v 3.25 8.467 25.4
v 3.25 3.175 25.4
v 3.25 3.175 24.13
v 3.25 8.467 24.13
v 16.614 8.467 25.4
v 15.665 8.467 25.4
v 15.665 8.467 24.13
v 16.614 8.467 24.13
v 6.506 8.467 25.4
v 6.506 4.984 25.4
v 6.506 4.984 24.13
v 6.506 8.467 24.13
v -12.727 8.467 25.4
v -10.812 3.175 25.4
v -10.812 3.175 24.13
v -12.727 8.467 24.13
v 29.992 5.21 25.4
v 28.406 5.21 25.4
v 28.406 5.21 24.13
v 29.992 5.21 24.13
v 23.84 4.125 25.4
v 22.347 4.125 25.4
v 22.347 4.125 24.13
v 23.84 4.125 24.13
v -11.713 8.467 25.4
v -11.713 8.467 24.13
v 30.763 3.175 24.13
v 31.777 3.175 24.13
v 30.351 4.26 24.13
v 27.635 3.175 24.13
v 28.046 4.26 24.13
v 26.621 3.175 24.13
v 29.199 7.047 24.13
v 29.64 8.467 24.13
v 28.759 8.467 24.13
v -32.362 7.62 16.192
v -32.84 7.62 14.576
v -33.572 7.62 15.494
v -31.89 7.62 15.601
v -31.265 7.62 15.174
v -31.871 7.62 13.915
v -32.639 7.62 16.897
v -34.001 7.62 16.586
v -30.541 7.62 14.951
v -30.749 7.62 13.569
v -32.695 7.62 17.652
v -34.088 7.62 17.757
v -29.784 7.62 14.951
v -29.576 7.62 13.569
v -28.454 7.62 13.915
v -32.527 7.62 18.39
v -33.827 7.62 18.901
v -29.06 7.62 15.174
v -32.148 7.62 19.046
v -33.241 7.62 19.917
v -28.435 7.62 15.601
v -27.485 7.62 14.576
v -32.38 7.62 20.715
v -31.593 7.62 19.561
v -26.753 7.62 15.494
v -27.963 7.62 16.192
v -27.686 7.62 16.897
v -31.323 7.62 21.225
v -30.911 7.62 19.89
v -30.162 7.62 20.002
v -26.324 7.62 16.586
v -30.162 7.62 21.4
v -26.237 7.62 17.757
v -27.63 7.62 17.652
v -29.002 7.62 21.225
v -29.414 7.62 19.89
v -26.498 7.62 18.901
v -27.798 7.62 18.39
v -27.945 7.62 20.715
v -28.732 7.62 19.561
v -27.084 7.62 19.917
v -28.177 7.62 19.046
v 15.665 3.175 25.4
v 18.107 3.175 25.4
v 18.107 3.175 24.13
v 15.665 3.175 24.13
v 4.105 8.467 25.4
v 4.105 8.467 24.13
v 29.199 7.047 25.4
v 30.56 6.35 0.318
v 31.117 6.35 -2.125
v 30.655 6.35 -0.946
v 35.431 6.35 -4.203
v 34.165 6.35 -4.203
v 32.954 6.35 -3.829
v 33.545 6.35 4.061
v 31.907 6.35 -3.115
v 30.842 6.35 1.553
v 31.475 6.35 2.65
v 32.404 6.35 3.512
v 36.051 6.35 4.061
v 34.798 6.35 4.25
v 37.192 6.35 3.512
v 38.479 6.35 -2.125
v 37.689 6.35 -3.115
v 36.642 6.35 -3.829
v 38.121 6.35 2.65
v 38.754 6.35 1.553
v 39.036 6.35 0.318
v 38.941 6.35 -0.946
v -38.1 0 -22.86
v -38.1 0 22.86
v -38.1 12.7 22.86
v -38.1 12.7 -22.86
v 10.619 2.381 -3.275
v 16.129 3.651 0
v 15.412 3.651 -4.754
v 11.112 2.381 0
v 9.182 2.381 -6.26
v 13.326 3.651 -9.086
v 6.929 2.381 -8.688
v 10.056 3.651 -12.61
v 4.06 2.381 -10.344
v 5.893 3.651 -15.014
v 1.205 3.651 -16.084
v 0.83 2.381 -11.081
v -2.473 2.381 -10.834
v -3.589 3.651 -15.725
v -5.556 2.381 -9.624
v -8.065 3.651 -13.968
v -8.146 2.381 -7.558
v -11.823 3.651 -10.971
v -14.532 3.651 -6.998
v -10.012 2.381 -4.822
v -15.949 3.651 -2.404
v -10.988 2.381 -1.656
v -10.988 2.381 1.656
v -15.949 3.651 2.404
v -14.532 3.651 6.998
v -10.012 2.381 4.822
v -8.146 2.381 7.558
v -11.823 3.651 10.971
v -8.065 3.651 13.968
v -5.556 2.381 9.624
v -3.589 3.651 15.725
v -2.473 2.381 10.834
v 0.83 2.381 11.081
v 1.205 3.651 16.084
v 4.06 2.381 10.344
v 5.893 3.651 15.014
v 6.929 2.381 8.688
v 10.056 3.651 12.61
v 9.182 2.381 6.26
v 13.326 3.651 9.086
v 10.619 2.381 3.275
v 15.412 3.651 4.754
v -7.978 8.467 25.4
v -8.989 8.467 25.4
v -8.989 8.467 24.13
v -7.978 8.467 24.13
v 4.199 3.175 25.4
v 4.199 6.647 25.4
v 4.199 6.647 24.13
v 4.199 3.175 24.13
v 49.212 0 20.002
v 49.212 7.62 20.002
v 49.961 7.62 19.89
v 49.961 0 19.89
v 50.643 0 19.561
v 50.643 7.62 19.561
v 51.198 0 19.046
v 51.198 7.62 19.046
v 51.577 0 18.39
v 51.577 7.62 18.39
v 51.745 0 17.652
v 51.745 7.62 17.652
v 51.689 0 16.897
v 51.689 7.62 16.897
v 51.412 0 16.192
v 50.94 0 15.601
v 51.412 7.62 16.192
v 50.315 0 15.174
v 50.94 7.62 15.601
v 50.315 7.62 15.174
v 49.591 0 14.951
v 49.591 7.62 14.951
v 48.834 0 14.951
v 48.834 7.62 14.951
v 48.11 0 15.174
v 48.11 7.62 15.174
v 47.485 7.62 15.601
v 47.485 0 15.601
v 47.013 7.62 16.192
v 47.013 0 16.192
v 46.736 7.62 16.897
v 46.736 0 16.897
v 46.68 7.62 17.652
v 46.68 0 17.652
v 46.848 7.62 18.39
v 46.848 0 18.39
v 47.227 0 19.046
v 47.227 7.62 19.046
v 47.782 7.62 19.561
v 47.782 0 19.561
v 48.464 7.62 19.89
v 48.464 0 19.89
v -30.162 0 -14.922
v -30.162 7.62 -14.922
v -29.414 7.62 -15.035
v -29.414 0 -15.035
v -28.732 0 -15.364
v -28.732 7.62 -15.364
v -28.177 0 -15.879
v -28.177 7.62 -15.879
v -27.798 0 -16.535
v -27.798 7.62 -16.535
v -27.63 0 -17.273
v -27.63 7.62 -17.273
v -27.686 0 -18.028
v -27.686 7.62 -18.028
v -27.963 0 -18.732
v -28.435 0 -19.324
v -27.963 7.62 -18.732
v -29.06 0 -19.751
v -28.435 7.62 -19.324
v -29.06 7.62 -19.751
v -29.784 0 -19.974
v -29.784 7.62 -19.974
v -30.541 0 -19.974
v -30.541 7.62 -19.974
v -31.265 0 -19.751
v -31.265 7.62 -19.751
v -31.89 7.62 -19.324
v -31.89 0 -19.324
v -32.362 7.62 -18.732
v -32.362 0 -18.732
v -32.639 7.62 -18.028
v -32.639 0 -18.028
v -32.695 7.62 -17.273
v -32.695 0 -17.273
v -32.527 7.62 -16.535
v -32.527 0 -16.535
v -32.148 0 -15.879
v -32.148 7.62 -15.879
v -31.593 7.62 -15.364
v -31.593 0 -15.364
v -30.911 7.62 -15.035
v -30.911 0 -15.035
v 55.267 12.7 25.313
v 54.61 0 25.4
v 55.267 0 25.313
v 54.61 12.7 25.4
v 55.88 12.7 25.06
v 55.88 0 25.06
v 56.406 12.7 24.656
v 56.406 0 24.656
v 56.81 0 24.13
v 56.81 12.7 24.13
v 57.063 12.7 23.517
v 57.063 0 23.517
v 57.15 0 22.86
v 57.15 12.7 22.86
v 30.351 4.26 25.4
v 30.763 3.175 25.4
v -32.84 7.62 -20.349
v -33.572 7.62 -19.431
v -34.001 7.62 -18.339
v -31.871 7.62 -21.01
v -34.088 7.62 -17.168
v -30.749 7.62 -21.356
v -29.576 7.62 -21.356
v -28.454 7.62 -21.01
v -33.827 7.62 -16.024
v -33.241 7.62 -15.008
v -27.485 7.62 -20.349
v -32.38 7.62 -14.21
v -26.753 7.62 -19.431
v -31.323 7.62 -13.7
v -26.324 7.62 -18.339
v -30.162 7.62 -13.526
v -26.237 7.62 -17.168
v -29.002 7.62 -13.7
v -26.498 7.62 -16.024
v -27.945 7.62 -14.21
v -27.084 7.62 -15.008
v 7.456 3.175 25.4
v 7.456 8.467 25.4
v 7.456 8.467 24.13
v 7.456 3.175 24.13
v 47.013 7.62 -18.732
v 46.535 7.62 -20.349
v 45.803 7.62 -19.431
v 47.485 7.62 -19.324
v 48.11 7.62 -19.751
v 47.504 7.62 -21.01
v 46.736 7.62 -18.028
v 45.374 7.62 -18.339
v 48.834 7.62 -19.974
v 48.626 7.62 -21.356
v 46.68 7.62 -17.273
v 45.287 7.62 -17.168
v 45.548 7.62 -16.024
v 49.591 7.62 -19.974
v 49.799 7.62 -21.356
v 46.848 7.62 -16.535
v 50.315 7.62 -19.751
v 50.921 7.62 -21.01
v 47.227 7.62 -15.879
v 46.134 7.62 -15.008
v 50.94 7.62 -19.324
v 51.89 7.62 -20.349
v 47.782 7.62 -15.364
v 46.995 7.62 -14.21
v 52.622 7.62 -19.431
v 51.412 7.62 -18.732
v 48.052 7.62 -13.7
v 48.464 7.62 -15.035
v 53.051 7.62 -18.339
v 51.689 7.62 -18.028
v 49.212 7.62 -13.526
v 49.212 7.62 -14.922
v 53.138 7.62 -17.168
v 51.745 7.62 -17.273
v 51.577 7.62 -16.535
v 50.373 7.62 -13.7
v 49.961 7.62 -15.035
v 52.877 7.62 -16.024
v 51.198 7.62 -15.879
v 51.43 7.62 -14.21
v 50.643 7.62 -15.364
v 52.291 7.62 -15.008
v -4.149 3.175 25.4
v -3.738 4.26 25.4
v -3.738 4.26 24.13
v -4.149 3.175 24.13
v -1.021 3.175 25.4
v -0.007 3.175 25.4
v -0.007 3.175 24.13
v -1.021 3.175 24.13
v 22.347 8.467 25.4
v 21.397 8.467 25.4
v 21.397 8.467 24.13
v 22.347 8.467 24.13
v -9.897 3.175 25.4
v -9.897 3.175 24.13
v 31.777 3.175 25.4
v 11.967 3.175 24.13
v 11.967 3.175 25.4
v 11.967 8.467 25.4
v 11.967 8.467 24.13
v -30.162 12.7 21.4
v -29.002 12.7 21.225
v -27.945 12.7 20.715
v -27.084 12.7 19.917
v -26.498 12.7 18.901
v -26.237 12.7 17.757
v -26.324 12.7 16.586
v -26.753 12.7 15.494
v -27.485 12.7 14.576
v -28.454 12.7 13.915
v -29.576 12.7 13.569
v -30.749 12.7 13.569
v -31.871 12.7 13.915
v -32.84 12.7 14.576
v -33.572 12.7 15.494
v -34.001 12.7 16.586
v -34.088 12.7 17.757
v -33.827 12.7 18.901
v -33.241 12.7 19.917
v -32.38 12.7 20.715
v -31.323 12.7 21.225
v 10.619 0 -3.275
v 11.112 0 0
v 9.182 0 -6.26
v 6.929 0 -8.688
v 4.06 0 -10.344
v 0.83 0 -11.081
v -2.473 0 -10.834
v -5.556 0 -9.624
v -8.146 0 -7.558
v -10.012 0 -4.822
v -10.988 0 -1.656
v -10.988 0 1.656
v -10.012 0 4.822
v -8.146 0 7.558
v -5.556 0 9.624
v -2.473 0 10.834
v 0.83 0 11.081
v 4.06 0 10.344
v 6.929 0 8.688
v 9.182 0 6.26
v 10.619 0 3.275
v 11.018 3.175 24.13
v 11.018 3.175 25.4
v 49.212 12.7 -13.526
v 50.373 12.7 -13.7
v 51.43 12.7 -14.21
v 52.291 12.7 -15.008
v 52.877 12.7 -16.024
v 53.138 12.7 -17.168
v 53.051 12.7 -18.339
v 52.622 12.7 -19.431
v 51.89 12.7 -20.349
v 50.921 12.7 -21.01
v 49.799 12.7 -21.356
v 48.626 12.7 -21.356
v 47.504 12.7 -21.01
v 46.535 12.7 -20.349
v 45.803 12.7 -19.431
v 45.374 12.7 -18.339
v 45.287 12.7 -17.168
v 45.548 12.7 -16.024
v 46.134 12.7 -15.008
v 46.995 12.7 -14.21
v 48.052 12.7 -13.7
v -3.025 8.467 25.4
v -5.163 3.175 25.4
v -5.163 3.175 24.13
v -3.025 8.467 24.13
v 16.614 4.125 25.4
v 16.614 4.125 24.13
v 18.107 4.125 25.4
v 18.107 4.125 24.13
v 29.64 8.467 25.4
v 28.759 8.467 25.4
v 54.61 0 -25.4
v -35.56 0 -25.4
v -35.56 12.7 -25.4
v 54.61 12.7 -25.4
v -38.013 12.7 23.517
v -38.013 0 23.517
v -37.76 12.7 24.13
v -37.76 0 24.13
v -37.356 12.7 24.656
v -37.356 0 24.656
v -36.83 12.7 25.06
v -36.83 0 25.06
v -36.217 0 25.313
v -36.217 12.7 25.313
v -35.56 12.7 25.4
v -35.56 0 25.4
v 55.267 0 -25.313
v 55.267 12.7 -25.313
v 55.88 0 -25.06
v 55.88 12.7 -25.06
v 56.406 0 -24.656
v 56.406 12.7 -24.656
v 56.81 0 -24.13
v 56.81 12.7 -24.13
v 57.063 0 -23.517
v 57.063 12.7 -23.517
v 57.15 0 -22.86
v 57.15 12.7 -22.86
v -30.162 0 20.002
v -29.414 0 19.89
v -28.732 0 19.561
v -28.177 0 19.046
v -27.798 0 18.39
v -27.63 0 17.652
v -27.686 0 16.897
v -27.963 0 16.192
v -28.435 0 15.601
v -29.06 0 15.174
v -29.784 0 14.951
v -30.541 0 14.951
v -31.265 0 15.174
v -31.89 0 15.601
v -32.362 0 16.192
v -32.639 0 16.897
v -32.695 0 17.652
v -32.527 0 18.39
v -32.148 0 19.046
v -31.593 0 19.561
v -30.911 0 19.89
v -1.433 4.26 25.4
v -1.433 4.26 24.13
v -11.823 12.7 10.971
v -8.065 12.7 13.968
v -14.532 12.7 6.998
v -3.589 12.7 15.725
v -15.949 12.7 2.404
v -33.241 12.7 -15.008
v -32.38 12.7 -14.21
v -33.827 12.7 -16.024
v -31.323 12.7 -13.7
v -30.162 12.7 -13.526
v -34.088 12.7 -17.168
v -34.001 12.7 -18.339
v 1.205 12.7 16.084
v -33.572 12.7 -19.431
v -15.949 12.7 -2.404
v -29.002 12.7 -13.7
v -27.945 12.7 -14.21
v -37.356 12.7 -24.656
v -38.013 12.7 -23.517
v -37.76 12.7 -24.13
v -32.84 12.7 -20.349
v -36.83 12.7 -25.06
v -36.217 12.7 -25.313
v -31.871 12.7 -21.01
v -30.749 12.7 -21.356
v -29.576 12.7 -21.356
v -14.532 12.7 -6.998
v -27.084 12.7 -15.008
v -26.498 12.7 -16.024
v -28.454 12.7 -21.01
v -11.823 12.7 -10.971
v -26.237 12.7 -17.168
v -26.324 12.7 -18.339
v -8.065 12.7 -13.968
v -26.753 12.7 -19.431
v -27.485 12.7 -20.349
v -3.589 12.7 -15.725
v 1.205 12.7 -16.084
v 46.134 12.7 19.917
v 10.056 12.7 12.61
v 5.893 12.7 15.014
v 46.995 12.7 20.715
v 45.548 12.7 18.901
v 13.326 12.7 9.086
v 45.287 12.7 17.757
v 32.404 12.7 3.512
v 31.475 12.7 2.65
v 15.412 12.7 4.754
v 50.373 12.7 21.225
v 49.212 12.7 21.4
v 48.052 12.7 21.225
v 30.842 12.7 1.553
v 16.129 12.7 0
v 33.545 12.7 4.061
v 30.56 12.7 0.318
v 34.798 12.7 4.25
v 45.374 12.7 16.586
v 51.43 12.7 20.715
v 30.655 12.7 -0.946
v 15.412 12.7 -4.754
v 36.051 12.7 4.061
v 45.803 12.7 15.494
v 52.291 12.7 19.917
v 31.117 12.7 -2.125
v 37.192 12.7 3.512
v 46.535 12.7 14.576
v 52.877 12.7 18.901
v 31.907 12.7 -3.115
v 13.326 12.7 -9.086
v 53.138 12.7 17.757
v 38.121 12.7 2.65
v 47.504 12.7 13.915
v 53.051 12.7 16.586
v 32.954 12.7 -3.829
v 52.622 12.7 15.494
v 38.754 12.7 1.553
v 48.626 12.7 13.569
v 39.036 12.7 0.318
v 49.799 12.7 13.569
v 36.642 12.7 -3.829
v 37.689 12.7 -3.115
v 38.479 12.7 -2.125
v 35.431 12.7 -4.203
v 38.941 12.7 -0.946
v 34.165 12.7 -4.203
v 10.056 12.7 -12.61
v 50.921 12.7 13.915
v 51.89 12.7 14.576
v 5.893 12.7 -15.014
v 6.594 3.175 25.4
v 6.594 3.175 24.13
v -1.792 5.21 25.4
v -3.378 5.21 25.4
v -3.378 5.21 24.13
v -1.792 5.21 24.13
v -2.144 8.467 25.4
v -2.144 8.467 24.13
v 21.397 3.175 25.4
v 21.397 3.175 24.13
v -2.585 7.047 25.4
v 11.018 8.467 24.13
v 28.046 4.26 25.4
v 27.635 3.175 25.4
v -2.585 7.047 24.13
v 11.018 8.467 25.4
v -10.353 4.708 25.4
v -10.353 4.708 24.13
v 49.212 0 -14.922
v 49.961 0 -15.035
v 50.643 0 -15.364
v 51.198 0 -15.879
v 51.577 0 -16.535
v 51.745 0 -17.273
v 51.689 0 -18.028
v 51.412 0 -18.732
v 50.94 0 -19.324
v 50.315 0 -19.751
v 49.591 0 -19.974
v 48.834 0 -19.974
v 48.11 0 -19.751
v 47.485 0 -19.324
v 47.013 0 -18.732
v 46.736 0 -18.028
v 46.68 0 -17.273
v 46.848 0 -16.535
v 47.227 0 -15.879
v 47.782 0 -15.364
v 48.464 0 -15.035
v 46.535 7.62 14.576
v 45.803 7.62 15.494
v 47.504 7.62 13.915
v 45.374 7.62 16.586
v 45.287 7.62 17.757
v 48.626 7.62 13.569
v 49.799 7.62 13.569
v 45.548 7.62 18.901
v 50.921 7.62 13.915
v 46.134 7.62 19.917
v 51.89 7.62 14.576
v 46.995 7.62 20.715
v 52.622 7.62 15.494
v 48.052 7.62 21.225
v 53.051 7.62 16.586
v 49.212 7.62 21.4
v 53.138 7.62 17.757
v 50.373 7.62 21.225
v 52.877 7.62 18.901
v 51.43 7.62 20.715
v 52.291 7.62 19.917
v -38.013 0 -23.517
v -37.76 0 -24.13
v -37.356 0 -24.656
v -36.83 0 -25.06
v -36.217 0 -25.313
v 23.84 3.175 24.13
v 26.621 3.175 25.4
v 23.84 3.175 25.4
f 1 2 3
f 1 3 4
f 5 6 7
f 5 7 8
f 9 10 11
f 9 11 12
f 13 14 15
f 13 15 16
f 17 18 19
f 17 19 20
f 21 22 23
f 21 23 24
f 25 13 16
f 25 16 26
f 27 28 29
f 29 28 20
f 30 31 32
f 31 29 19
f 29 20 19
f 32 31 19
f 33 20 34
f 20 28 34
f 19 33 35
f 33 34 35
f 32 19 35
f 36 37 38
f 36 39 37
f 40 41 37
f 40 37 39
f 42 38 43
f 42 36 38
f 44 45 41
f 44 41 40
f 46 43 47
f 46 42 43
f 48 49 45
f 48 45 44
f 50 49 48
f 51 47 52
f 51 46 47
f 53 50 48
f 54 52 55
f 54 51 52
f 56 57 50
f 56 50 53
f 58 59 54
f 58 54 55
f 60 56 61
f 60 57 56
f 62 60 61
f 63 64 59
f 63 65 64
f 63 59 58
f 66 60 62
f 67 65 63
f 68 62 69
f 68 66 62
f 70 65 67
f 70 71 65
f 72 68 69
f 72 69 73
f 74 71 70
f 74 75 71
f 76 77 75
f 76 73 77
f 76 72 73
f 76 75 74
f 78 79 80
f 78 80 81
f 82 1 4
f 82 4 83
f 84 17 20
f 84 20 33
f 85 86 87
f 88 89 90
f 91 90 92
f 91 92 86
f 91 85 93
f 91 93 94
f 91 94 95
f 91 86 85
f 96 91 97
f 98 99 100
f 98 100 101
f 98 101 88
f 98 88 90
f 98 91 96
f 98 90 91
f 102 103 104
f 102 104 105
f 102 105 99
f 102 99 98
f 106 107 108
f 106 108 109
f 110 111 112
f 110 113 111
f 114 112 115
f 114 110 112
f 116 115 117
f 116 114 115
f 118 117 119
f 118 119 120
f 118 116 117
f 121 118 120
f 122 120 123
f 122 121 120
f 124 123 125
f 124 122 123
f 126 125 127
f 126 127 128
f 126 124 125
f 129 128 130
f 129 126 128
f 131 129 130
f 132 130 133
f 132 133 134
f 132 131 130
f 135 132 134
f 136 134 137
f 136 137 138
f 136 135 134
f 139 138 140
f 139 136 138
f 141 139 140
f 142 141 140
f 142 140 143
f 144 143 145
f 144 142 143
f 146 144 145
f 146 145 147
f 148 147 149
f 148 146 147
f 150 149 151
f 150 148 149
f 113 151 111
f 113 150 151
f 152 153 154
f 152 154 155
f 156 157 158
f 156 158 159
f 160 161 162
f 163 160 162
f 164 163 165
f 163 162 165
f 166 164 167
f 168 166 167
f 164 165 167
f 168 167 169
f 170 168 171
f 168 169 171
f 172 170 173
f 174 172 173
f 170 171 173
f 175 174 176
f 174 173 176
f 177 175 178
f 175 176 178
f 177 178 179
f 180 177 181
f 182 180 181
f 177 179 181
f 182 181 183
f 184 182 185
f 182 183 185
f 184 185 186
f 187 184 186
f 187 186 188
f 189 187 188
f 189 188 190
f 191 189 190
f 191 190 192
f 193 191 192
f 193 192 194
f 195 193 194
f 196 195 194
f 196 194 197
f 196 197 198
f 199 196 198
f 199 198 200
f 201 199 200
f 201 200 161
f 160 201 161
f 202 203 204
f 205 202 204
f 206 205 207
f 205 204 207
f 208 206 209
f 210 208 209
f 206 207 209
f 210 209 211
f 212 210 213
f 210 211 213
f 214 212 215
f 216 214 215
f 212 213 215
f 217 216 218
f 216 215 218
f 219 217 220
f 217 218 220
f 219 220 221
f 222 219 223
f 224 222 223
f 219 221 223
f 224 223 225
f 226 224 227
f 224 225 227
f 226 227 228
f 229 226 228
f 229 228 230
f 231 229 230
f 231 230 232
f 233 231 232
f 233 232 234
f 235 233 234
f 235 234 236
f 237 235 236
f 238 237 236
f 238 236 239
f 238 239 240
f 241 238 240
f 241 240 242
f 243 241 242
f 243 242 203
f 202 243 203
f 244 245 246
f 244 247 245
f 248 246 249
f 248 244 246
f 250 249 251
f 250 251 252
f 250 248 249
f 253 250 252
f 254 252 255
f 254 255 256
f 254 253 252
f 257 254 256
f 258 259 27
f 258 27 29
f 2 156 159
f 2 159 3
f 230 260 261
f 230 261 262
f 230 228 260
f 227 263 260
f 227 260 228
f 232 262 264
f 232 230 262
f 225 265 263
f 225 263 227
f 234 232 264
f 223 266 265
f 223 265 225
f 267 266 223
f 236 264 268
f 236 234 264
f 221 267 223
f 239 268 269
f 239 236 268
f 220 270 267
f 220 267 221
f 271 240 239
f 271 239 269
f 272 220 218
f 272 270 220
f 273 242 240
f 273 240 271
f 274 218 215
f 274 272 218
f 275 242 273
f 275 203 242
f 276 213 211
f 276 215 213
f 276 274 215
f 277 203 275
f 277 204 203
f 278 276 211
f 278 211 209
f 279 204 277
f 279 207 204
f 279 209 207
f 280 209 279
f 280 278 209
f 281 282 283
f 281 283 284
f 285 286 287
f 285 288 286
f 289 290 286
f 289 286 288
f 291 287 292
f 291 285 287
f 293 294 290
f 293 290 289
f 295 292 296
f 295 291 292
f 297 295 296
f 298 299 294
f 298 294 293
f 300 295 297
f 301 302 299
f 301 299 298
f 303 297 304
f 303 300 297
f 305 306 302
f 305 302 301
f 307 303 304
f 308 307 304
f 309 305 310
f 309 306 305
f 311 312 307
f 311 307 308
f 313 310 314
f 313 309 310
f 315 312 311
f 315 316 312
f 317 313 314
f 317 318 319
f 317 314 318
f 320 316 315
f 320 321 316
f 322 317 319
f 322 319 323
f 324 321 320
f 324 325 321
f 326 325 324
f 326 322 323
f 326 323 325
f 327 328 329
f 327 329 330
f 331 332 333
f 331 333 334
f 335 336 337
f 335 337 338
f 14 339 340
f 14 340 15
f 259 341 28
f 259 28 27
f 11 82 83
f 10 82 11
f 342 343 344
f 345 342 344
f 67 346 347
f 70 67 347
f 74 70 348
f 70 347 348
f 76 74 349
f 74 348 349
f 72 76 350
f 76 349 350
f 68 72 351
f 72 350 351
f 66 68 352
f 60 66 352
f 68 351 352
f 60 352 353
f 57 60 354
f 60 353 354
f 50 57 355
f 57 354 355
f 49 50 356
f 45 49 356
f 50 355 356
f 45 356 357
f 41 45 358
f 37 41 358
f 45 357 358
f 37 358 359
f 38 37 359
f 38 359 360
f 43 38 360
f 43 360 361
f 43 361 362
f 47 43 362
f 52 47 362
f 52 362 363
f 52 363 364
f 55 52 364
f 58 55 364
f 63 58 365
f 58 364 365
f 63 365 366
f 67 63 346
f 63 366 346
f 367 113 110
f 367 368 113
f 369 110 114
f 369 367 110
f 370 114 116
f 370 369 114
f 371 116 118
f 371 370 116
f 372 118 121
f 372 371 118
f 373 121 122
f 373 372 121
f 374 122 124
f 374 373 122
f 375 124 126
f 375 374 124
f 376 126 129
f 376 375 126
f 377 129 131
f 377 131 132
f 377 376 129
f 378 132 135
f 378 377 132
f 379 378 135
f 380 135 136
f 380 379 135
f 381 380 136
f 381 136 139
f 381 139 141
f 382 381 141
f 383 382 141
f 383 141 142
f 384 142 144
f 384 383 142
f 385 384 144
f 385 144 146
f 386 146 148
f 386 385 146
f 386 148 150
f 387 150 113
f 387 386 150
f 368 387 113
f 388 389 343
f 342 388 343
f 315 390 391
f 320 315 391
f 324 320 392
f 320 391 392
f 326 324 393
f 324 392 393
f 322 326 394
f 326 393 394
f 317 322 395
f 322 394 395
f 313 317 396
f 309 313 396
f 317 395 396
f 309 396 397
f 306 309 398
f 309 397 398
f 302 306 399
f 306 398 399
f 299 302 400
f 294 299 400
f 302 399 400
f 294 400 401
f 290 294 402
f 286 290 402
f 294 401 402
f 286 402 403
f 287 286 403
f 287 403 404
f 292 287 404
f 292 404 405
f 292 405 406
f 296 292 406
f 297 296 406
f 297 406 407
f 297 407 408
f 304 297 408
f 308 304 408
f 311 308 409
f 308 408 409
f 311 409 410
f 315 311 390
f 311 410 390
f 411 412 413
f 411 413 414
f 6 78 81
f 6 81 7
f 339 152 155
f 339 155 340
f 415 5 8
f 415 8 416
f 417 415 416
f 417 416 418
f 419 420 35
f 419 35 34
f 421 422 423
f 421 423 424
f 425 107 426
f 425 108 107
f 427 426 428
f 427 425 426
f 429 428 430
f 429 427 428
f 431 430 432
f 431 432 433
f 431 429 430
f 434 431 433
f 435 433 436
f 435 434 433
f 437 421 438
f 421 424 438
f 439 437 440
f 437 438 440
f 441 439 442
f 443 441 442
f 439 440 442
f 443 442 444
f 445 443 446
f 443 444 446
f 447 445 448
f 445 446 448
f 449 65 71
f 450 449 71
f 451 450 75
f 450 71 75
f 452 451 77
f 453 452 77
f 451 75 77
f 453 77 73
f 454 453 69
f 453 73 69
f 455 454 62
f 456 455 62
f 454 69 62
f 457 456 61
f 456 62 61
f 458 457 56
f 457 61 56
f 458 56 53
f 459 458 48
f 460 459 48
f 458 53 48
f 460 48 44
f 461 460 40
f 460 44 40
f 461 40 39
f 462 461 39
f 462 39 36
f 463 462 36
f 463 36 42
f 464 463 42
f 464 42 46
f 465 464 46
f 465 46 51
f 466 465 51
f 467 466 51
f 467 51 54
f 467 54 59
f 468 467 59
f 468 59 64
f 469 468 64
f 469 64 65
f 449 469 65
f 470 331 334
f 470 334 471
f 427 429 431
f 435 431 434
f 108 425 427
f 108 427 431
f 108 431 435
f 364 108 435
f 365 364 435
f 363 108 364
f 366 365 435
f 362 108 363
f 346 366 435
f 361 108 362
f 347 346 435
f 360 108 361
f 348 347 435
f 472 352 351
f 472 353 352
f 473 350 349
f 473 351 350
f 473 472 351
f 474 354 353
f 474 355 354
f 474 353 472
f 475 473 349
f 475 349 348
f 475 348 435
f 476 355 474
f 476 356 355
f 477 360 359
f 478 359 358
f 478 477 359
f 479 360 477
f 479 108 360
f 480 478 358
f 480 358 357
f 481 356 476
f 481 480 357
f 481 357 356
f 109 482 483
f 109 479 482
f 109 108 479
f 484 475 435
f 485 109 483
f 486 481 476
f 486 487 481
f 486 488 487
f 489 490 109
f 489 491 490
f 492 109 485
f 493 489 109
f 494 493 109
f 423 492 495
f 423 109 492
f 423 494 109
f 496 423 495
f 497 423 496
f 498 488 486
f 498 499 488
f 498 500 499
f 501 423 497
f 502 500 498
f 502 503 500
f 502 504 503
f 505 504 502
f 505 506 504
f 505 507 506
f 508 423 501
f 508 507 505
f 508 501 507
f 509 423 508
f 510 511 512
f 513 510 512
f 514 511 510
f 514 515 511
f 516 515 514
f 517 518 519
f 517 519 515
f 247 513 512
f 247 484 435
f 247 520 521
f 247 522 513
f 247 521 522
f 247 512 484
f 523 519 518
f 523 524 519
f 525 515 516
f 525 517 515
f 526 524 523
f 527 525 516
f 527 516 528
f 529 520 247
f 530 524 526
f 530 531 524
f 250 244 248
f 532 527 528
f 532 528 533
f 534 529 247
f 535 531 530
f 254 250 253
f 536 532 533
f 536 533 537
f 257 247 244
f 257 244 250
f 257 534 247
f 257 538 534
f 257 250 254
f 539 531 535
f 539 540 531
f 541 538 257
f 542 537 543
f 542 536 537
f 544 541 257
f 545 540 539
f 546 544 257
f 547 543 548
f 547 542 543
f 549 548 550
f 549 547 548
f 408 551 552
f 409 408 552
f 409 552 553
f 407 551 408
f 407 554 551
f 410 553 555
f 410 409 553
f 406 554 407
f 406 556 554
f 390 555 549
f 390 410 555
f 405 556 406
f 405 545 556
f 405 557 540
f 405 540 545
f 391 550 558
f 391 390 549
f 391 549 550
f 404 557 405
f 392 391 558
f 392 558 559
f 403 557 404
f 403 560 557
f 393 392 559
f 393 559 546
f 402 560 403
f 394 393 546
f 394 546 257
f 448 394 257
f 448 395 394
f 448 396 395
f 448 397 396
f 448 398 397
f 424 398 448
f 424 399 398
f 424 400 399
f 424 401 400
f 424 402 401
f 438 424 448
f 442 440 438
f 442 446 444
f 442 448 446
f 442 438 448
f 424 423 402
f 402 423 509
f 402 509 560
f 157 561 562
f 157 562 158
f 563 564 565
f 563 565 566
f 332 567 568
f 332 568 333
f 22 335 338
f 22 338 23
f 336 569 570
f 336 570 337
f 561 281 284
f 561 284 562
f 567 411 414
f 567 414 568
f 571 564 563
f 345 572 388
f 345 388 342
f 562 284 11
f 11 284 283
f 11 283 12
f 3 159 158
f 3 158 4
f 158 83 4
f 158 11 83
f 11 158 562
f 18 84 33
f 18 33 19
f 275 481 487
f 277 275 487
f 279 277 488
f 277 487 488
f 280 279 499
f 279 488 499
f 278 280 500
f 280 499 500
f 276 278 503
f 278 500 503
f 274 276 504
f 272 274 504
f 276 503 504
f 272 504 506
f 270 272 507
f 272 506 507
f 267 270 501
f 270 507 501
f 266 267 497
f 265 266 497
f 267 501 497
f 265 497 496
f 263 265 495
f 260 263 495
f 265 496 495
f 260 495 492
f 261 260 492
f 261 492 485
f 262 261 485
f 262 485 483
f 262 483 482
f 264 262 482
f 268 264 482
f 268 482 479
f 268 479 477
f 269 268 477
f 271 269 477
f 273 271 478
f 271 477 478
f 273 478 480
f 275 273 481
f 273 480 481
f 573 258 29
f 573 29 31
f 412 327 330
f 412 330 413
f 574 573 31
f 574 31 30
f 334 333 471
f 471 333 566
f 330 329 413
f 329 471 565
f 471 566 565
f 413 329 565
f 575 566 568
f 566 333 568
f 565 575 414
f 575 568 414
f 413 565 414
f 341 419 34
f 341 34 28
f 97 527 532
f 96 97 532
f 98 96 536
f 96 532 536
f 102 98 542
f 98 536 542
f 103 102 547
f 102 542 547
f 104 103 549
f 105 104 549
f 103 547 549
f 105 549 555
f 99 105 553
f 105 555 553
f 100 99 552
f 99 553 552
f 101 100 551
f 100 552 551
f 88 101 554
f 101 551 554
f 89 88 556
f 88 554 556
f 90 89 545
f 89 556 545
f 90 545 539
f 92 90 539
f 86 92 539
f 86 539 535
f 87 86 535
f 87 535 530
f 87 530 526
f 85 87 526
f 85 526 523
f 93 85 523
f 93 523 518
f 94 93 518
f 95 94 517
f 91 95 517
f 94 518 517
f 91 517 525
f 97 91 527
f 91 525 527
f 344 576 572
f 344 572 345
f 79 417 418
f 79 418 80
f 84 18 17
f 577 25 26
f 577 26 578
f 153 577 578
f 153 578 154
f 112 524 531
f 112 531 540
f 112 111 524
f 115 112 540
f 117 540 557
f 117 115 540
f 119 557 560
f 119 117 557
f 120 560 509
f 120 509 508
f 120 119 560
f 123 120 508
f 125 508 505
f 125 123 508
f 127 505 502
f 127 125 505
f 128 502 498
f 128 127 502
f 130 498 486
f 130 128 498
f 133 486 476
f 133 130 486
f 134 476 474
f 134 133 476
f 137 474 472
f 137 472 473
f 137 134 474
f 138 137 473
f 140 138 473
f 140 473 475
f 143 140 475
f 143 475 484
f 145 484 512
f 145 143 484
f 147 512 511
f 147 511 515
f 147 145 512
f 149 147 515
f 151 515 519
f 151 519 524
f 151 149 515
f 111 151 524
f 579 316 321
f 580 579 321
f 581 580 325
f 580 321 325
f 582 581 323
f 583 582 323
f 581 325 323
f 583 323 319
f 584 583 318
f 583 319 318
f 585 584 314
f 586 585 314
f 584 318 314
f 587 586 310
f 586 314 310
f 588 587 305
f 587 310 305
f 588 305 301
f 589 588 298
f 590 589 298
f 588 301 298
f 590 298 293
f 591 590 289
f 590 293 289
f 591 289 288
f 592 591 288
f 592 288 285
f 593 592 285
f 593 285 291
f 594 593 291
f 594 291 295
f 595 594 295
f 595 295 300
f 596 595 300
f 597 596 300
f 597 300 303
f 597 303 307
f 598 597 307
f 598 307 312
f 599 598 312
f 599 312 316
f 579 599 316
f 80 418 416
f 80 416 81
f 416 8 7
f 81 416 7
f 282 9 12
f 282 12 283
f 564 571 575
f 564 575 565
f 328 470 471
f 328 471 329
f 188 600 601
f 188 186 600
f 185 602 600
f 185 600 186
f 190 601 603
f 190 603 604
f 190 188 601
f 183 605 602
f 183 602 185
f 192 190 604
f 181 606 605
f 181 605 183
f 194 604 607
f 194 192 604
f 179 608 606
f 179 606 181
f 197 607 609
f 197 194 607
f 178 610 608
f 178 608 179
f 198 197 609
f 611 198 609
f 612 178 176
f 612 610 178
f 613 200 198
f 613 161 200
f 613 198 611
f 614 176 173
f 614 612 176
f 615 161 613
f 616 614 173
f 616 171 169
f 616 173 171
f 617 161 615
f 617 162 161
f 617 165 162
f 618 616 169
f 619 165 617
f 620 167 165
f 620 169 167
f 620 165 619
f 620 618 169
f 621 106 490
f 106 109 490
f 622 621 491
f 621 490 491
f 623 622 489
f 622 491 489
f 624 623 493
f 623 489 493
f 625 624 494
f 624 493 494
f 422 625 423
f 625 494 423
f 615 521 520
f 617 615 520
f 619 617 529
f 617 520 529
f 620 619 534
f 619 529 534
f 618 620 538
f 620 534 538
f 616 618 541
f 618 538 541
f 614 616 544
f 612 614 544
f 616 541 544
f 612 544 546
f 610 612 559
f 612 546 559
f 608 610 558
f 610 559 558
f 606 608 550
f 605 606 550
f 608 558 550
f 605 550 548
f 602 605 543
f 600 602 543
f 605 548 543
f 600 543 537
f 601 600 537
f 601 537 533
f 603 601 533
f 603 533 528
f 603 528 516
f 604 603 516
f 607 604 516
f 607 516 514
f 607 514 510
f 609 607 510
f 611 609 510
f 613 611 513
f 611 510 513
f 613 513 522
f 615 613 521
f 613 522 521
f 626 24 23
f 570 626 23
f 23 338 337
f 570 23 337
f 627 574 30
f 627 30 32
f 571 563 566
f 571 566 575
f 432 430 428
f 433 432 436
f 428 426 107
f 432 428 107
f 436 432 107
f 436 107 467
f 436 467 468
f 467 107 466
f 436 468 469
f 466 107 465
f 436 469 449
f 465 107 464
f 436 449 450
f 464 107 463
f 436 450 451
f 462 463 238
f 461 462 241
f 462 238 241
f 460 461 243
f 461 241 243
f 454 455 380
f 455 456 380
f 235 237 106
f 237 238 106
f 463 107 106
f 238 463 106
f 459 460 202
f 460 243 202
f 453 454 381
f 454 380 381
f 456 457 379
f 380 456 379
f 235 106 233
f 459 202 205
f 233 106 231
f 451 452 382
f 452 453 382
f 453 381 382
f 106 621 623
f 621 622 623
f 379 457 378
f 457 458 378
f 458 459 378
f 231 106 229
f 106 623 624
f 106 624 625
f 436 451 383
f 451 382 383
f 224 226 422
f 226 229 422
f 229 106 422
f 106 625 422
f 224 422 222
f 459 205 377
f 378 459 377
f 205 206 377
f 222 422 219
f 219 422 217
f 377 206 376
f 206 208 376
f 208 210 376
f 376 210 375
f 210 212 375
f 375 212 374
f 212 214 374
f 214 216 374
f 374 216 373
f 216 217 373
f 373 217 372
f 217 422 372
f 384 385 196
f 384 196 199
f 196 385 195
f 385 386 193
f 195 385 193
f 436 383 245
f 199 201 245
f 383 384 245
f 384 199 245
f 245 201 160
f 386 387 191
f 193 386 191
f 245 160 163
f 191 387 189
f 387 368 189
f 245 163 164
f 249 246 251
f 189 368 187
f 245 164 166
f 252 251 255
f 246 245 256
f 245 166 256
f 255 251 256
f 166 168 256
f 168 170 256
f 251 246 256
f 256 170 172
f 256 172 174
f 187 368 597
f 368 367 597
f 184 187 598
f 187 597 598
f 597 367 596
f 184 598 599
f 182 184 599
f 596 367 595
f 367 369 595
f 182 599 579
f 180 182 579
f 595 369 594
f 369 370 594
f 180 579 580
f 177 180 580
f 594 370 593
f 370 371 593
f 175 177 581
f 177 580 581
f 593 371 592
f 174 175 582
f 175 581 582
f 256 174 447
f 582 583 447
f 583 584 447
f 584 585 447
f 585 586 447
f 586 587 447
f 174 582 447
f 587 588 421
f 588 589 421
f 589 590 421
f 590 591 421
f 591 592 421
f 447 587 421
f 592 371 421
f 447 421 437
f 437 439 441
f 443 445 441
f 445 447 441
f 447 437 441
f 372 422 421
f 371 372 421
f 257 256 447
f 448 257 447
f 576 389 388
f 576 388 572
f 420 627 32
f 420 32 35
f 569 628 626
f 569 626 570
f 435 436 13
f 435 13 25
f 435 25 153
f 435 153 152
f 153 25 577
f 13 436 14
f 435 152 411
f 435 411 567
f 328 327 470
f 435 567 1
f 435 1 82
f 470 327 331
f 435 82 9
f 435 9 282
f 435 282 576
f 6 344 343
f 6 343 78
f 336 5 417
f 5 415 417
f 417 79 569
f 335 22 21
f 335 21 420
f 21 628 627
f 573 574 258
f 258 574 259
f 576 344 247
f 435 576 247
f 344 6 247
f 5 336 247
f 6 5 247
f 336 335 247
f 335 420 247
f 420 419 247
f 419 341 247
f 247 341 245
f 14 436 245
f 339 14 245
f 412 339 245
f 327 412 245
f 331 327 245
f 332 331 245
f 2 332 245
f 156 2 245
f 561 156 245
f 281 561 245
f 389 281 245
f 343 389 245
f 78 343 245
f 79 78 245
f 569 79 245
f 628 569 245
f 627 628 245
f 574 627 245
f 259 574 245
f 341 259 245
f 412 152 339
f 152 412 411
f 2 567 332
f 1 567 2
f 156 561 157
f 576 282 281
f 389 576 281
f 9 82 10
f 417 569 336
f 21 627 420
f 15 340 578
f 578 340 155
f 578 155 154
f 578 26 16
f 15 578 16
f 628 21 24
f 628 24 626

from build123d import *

# Parameters (mm, degrees)
SKETCH1_W           = 95.25
SKETCH1_H           = 50.8
BOSS_EXTRUDE1_DEPTH = 12.7
SKETCH4_R           = 2.54
CUT_EXTRUDE3_DEPTH  = 64.816710194
FILLET2_R           = 2.54
SKETCH8_R           = 4.25
CUT_EXTRUDE4_DEPTH  = 6.35
SKETCH9_W           = 0.949786324
SKETCH9_H           = 5.291666667
CUT_EXTRUDE5_DEPTH  = 1.27
SKETCH10_R          = 3.937
CUT_EXTRUDE6_DEPTH  = 5.08


with BuildPart() as part:
    # Sketch1 → Boss-Extrude1 (new body)
    with BuildSketch(Plane(origin=(0, 0, 0), x_dir=(1, 0, 0), z_dir=(0, 1, 0))):
        with Locations((9.525, 0)):
            Rectangle(SKETCH1_W, SKETCH1_H)
    extrude(amount=BOSS_EXTRUDE1_DEPTH)

    # Sketch4 → Cut-Extrude3 (cut, through all)
    with BuildSketch(Plane(origin=(0, 12.7, 0), x_dir=(1, 0, 0), z_dir=(0, 1, 0))):
        with Locations(Location((-30.1625, 17.4625, 0), (0, 0, 270))):
            Circle(SKETCH4_R)
        with Locations(Location((49.2125, 17.4625, 0), (0, 0, 270))):
            Circle(SKETCH4_R)
        with Locations(Location((49.2125, -17.4625, 0), (0, 0, 270))):
            Circle(SKETCH4_R)
        with Locations(Location((-30.1625, -17.4625, 0), (0, 0, 270))):
            Circle(SKETCH4_R)
    extrude(amount=-CUT_EXTRUDE3_DEPTH, mode=Mode.SUBTRACT)

    # Fillet2
    fillet2_edges = [part.edges().sort_by_distance(p)[0] for p in [
        (57.15, 6.35, 25.4),
        (-38.1, 6.35, 25.4),
        (-38.1, 6.35, -25.4),
        (57.15, 6.35, -25.4),
    ]]
    fillet(fillet2_edges, radius=FILLET2_R)

    # Sketch6 → Cut-Revolve1 (revolve, cut)
    with BuildSketch(Plane.XY, mode=Mode.PRIVATE) as cut_revolve1_sk:
        Polygon((0, 0), (0, 12.7), (-16.129, 12.7), (-16.129, 3.65125), (-11.1125, 2.38125), (-11.1125, 0), align=None)
    revolve(cut_revolve1_sk.sketch.rotate(Axis((0, 0, 0), (0, 1, 0)), 180), axis=Axis((0, 0, 0), (0, 1, 0)), mode=Mode.SUBTRACT)

    # Sketch8 → Cut-Extrude4 (cut)
    with BuildSketch(Plane(origin=(0, 12.7, 0), x_dir=(1, 0, 0), z_dir=(0, 1, 0))):
        with Locations(Location((34.798, 0, 0), (0, 0, 270))):
            Circle(SKETCH8_R)
    extrude(amount=-CUT_EXTRUDE4_DEPTH, mode=Mode.SUBTRACT)

    # Sketch9 → Cut-Extrude5 (cut)
    # profile 1 of 7: a face of its own
    with BuildSketch(Plane.XY.offset(25.4)):
        Polygon((-12.727136752, 8.466666667), (-11.712688635, 8.466666667), (-10.35267094, 4.707802484), (-8.989473157, 8.466666667), (-7.978205128, 8.466666667), (-9.896858307, 3.175), (-10.811663662, 3.175), align=None)
    # profile 2 of 7: a face of its own
    with BuildSketch(Plane.XY.offset(25.4)):
        Polygon((-3.024687834, 8.466666667), (-2.143803419, 8.466666667), (-0.006784188, 3.175), (-1.021232305, 3.175), (-1.432523705, 4.260470085), (-3.738087607, 4.260470085), (-4.149379006, 3.175), (-5.162767094, 3.175), align=None)
        Polygon((-2.584775641, 7.047287326), (-3.377677618, 5.21025641), (-1.791873665, 5.21025641), align=None, mode=Mode.SUBTRACT)
    # profile 3 of 7: a face of its own
    with BuildSketch(Plane.XY.offset(25.4)):
        Polygon((3.249626068, 8.466666667), (4.105069778, 8.466666667), (6.506036325, 4.984470152), (6.506036325, 8.466666667), (7.45582265, 8.466666667), (7.45582265, 3.175), (6.594018763, 3.175), (4.199412393, 6.646596221), (4.199412393, 3.175), (3.249626068, 3.175), align=None)
    # profile 4 of 7: a face of its own
    with BuildSketch(Plane.XY.offset(25.4)):
        with Locations((11.49241453, 5.820833334)):
            Rectangle(SKETCH9_W, SKETCH9_H)
    # profile 5 of 7: a face of its own
    with BuildSketch(Plane.XY.offset(25.4)):
        Polygon((15.664690171, 8.466666667), (16.614476496, 8.466666667), (16.614476496, 4.124786325), (18.106997863, 4.124786325), (18.106997863, 3.175), (15.664690171, 3.175), align=None)
    # profile 6 of 7: a face of its own
    with BuildSketch(Plane.XY.offset(25.4)):
        Polygon((21.39732906, 8.466666667), (22.347115385, 8.466666667), (22.347115385, 4.124786325), (23.839636752, 4.124786325), (23.839636752, 3.175), (21.39732906, 3.175), align=None)
    # profile 7 of 7: a face of its own
    with BuildSketch(Plane.XY.offset(25.4)):
        Polygon((28.759233106, 8.466666667), (29.640117521, 8.466666667), (31.777136752, 3.175), (30.762688635, 3.175), (30.351397236, 4.260470085), (28.045833333, 4.260470085), (27.634541934, 3.175), (26.621153846, 3.175), align=None)
        Polygon((29.199145299, 7.047287326), (28.406243323, 5.21025641), (29.992047276, 5.21025641), align=None, mode=Mode.SUBTRACT)
    extrude(amount=-CUT_EXTRUDE5_DEPTH, mode=Mode.SUBTRACT)

    # Sketch10 → Cut-Extrude6 (cut)
    with BuildSketch(Plane(origin=(0, 12.7, 0), x_dir=(1, 0, 0), z_dir=(0, 1, 0))):
        with Locations(Location((-30.1625, 17.4625, 0), (0, 0, 270))):
            Circle(SKETCH10_R)
        with Locations(Location((-30.1625, -17.4625, 0), (0, 0, 270))):
            Circle(SKETCH10_R)
        with Locations(Location((49.2125, 17.4625, 0), (0, 0, 270))):
            Circle(SKETCH10_R)
        with Locations(Location((49.2125, -17.4625, 0), (0, 0, 270))):
            Circle(SKETCH10_R)
    extrude(amount=-CUT_EXTRUDE6_DEPTH, mode=Mode.SUBTRACT)


solid = part.part
